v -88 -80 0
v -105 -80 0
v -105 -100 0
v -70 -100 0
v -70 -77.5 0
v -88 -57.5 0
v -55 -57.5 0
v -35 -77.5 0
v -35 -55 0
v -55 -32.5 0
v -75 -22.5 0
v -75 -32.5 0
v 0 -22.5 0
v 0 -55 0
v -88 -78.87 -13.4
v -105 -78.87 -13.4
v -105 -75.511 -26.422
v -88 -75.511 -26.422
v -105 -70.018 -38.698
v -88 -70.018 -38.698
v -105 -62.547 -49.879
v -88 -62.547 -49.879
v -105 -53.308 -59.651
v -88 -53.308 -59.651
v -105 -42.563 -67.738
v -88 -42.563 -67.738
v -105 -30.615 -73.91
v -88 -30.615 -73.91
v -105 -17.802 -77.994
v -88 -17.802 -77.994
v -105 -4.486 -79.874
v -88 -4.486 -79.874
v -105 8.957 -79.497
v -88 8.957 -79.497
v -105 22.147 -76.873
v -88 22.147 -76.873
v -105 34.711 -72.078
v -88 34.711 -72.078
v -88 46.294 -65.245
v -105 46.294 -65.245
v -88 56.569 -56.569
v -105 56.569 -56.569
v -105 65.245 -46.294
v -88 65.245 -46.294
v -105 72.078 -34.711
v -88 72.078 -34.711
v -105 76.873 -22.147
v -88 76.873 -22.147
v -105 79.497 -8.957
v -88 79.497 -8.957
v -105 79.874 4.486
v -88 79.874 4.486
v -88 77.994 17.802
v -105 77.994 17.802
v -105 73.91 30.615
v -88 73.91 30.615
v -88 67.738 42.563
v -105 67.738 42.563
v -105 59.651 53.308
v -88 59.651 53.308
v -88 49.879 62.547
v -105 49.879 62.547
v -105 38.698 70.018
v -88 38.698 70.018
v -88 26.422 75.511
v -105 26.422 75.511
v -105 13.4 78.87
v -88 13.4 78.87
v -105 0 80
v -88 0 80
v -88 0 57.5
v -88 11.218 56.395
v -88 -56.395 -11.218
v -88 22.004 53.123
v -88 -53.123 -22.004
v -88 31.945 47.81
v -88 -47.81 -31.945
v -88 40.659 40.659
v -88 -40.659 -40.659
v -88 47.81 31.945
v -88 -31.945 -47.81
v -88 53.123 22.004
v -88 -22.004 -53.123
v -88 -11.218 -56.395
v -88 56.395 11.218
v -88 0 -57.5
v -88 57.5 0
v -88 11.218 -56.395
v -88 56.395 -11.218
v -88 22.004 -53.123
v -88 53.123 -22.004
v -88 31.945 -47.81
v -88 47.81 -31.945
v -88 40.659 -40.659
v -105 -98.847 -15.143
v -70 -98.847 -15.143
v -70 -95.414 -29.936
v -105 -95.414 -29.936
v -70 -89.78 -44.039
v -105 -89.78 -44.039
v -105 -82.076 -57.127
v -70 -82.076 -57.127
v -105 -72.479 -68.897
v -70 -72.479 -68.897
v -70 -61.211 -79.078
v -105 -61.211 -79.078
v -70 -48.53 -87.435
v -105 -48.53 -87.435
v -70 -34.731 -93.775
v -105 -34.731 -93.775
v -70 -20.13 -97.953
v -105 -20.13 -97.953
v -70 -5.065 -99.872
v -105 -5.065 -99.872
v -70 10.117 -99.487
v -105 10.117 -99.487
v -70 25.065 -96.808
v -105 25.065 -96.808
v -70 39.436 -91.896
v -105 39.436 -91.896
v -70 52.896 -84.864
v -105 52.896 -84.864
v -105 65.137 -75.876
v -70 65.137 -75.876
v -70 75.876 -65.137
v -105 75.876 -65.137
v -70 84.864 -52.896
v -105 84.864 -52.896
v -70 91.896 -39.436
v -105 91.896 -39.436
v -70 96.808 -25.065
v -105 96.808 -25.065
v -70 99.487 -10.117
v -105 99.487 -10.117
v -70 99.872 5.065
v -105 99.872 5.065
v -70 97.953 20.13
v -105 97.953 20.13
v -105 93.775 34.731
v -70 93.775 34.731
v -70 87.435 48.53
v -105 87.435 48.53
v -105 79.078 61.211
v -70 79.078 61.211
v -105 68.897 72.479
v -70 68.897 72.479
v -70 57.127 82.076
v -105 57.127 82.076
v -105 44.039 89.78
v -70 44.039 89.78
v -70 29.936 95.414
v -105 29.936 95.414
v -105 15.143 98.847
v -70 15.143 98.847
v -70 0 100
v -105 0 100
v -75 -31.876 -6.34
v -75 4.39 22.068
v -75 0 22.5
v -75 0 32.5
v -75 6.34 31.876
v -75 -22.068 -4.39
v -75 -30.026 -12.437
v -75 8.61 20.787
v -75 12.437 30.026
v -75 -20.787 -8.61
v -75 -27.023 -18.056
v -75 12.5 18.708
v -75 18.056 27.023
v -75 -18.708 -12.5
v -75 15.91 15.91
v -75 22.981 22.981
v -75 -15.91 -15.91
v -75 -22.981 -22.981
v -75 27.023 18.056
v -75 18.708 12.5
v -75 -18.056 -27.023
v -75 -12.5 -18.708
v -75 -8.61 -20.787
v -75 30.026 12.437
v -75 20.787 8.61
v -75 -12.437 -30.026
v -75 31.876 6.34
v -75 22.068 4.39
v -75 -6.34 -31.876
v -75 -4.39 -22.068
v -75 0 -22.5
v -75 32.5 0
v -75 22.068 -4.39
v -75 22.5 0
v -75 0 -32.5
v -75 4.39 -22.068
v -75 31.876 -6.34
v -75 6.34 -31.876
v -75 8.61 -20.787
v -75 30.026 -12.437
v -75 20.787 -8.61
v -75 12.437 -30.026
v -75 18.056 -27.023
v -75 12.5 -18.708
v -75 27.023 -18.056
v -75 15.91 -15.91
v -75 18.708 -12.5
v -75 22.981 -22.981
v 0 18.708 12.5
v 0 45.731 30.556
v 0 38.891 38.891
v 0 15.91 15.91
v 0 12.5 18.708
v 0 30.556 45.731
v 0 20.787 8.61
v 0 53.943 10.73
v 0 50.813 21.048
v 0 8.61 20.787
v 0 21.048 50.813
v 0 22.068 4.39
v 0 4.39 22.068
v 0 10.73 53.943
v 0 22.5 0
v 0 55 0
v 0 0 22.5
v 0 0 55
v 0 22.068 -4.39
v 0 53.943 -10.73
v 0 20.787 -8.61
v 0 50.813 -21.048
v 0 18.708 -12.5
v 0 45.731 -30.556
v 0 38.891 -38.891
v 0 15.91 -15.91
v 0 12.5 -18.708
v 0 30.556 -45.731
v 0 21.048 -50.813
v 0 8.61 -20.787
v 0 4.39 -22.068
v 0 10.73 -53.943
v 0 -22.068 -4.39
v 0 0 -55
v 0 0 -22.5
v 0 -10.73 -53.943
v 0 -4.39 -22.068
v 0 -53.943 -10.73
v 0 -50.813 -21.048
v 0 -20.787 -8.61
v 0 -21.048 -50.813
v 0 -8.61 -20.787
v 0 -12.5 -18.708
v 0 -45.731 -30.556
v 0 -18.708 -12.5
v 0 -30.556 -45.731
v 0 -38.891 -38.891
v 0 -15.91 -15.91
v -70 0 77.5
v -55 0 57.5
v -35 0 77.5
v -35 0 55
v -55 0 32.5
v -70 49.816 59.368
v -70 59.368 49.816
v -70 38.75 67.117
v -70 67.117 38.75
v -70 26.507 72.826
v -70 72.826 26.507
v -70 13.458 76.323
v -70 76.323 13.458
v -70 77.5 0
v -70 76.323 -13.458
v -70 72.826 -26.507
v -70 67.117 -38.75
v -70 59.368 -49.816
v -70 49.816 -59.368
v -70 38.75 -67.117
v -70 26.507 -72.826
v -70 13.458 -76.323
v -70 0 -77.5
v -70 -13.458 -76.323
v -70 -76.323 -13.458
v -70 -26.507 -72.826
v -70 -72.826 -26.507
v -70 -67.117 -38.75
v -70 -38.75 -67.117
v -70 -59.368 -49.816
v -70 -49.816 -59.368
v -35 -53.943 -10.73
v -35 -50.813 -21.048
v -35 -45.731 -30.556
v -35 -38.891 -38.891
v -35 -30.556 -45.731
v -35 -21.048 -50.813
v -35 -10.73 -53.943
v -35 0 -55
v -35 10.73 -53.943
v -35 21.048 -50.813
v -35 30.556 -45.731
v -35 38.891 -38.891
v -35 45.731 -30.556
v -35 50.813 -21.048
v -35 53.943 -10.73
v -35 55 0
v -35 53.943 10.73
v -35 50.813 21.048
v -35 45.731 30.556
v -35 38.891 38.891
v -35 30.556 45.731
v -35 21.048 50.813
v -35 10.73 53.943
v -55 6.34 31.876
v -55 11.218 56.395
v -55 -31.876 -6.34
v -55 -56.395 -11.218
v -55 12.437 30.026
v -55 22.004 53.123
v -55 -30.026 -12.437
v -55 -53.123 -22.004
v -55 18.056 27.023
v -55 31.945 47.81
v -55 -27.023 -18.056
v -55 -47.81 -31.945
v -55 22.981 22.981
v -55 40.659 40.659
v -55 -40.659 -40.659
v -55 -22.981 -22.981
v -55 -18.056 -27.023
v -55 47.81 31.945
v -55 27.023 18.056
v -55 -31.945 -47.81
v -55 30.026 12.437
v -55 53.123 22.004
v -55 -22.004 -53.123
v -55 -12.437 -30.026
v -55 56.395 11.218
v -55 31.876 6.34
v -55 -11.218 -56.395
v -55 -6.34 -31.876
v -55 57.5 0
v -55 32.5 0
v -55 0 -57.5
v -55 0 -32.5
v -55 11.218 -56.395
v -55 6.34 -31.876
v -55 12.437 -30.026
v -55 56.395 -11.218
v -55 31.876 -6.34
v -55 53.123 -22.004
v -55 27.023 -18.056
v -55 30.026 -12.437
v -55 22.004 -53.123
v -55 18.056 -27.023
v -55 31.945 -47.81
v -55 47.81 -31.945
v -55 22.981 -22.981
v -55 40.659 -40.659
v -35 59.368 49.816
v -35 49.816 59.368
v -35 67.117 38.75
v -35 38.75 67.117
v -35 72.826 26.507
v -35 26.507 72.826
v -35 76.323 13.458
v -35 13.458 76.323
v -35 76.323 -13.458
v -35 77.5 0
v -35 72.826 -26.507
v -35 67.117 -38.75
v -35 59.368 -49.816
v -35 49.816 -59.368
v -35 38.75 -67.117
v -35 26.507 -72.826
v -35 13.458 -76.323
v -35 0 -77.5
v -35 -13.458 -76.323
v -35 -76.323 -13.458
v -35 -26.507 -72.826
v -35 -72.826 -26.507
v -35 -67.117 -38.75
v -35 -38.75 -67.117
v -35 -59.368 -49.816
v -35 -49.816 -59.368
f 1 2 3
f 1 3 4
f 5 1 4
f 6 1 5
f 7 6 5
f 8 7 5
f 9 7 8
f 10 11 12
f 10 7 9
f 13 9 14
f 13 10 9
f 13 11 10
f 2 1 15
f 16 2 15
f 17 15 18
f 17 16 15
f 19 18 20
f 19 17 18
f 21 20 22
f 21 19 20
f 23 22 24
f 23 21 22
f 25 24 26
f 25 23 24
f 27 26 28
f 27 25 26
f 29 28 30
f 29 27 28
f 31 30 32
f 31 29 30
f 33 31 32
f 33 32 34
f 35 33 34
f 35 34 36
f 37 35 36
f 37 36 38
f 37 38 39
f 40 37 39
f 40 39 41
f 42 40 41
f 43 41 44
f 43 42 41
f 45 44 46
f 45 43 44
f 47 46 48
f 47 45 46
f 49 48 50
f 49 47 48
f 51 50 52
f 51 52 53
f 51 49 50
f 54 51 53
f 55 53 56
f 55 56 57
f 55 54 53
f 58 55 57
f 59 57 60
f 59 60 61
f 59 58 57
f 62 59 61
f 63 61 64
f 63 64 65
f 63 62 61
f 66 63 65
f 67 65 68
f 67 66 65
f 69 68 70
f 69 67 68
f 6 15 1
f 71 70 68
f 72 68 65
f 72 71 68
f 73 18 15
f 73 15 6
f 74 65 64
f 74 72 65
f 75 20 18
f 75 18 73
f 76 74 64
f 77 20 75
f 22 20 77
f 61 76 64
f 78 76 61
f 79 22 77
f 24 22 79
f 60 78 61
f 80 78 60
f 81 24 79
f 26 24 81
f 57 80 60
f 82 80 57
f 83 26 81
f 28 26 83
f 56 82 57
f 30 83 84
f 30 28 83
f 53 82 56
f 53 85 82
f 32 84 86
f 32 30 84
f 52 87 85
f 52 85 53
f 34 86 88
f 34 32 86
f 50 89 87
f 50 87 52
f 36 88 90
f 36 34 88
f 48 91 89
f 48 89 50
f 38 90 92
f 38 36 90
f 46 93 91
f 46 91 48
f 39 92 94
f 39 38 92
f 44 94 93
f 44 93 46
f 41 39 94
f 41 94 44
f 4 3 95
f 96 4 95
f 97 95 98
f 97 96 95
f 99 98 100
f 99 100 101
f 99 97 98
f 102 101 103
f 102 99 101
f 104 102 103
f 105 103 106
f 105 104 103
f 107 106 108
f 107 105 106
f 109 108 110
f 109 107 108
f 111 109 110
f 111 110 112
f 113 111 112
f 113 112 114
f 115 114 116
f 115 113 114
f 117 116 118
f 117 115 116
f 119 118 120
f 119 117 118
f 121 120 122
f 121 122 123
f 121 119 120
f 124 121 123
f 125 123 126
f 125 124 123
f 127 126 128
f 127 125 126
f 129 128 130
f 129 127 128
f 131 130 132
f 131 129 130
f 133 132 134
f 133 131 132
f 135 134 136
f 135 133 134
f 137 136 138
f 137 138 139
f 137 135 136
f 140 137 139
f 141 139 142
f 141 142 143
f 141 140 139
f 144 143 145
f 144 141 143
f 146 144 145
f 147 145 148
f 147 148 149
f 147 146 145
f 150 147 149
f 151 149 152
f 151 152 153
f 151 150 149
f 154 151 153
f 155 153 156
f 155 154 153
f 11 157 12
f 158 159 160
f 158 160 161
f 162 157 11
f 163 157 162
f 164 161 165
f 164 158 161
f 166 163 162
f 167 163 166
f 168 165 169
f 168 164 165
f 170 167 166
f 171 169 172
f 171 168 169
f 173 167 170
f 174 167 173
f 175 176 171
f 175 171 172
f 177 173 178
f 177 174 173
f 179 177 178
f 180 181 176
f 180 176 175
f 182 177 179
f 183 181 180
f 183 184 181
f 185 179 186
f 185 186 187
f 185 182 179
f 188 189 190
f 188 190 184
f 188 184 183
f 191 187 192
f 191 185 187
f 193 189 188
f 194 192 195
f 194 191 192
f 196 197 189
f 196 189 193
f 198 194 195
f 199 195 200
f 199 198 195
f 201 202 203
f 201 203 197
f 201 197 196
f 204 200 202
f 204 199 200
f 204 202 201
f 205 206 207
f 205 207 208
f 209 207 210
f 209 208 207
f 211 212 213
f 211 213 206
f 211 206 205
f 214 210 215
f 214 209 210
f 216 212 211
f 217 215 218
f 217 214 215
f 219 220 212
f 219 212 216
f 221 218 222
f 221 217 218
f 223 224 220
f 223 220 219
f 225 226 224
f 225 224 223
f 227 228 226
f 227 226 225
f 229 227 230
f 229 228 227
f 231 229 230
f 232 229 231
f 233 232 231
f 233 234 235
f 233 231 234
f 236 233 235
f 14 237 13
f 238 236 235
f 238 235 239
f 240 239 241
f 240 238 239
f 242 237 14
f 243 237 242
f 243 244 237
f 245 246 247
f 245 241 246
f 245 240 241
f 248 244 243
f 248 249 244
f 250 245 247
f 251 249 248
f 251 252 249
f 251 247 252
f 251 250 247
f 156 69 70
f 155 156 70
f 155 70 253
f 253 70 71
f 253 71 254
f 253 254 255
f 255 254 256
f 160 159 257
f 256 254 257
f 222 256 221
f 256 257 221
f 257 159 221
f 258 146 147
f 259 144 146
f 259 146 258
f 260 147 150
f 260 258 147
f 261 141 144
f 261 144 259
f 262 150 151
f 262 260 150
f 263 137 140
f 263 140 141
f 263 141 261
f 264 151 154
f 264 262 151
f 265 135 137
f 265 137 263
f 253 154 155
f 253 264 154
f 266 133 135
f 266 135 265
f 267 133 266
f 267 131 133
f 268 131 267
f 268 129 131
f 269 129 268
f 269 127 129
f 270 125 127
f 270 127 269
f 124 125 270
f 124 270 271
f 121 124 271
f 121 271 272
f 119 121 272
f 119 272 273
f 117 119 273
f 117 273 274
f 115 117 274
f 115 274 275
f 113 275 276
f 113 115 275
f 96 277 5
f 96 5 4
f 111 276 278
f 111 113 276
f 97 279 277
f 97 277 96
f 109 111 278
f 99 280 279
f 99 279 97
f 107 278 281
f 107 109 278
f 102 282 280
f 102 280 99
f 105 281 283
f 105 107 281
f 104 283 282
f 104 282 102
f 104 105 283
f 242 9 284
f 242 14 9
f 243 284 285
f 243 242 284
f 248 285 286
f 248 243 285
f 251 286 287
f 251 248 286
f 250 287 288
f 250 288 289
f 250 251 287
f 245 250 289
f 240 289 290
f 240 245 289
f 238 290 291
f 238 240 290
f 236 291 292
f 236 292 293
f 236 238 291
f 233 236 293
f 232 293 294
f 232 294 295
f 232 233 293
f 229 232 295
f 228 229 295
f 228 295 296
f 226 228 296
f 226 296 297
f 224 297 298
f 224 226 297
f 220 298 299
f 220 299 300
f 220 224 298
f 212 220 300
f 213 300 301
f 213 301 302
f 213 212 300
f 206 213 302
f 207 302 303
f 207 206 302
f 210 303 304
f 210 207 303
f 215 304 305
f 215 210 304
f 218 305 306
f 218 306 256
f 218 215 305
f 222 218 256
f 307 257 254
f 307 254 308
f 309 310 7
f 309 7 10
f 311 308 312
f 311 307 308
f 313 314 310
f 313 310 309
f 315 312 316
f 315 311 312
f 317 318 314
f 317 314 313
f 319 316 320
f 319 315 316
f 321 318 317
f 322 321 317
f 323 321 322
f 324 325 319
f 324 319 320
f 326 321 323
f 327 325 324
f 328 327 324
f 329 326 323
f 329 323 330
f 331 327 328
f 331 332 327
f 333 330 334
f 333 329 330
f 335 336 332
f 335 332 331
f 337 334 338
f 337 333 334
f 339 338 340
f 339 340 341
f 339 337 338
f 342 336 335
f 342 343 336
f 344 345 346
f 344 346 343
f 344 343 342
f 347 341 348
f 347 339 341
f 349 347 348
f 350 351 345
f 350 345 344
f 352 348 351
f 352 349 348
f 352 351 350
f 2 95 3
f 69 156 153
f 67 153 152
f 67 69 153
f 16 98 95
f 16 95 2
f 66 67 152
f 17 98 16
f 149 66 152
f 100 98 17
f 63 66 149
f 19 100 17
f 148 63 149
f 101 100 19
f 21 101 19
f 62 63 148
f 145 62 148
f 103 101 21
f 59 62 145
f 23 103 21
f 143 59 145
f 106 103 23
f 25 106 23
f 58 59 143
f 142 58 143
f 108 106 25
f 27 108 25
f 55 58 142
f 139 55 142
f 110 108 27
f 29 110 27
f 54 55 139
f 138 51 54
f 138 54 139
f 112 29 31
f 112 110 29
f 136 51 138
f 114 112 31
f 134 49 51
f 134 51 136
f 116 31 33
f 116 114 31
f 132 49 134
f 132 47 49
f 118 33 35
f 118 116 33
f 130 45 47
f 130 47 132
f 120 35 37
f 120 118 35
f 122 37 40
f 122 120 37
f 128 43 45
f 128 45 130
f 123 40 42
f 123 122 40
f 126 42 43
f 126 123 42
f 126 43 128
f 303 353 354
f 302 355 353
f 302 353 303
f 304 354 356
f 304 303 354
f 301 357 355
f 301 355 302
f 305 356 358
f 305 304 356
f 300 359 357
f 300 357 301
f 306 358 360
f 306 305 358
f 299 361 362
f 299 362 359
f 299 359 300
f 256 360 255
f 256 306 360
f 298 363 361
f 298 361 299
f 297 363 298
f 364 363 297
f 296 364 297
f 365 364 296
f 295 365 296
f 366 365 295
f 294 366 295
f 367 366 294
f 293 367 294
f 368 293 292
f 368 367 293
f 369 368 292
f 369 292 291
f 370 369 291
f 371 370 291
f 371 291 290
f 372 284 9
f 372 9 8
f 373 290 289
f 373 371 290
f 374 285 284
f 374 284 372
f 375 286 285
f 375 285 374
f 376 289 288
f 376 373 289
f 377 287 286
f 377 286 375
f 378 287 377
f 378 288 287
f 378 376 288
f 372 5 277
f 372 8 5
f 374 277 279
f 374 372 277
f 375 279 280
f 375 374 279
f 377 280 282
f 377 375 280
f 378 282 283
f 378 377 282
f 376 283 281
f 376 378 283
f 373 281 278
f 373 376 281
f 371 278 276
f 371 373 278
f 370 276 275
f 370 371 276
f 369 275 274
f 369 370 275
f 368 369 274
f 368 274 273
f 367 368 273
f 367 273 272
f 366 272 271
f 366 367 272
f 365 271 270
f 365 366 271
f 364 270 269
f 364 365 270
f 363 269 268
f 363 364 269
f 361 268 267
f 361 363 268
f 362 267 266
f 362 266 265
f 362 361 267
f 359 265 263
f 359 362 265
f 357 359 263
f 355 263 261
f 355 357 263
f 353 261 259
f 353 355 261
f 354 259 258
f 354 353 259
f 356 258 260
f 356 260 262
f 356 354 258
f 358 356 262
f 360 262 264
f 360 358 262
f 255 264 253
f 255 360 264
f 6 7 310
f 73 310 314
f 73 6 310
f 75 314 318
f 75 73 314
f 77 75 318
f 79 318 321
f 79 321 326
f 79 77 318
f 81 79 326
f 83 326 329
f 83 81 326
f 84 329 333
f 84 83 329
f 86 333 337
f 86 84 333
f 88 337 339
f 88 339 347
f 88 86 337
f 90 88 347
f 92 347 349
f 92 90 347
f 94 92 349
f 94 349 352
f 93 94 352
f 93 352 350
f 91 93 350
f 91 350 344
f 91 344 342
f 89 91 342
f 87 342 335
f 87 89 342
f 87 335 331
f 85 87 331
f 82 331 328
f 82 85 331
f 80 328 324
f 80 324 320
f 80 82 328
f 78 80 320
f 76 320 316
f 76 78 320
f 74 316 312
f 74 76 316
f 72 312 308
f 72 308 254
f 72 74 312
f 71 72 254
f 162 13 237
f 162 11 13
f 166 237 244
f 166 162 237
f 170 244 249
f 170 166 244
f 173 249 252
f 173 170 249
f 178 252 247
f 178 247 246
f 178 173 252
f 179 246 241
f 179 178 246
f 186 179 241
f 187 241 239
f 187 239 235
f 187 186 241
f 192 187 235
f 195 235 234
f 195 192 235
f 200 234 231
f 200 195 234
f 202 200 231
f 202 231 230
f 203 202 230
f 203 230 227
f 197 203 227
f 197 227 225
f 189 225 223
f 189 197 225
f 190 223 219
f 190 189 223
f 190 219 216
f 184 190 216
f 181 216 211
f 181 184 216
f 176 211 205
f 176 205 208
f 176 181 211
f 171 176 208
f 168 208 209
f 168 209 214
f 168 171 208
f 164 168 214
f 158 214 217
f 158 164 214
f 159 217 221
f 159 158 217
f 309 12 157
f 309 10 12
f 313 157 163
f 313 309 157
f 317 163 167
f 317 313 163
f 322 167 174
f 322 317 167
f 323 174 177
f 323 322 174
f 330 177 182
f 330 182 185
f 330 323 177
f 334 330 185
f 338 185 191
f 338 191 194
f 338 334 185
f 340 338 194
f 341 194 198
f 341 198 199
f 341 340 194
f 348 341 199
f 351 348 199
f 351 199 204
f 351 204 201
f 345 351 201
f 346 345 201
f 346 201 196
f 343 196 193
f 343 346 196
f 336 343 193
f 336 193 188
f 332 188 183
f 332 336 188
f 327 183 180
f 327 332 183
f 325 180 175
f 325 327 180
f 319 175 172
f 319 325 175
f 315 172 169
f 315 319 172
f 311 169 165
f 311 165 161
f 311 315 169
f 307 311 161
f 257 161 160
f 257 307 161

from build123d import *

# Parameters (mm, degrees)
REVOLUTION_ANGLE = 270


with BuildPart() as part:
    # Sketch → Revolution (revolve)
    with BuildSketch(Plane.XY):
        Polygon((0, -22.5), (-75, -22.5), (-75, -32.5), (-55, -32.5), (-55, -57.5), (-88, -57.5), (-88, -80), (-105, -80), (-105, -100), (-70, -100), (-70, -77.5), (-35, -77.5), (-35, -55), (0, -55), align=None)
    revolve(axis=Axis((0, 0, 0), (1, 0, 0)), revolution_arc=REVOLUTION_ANGLE)


solid = part.part
